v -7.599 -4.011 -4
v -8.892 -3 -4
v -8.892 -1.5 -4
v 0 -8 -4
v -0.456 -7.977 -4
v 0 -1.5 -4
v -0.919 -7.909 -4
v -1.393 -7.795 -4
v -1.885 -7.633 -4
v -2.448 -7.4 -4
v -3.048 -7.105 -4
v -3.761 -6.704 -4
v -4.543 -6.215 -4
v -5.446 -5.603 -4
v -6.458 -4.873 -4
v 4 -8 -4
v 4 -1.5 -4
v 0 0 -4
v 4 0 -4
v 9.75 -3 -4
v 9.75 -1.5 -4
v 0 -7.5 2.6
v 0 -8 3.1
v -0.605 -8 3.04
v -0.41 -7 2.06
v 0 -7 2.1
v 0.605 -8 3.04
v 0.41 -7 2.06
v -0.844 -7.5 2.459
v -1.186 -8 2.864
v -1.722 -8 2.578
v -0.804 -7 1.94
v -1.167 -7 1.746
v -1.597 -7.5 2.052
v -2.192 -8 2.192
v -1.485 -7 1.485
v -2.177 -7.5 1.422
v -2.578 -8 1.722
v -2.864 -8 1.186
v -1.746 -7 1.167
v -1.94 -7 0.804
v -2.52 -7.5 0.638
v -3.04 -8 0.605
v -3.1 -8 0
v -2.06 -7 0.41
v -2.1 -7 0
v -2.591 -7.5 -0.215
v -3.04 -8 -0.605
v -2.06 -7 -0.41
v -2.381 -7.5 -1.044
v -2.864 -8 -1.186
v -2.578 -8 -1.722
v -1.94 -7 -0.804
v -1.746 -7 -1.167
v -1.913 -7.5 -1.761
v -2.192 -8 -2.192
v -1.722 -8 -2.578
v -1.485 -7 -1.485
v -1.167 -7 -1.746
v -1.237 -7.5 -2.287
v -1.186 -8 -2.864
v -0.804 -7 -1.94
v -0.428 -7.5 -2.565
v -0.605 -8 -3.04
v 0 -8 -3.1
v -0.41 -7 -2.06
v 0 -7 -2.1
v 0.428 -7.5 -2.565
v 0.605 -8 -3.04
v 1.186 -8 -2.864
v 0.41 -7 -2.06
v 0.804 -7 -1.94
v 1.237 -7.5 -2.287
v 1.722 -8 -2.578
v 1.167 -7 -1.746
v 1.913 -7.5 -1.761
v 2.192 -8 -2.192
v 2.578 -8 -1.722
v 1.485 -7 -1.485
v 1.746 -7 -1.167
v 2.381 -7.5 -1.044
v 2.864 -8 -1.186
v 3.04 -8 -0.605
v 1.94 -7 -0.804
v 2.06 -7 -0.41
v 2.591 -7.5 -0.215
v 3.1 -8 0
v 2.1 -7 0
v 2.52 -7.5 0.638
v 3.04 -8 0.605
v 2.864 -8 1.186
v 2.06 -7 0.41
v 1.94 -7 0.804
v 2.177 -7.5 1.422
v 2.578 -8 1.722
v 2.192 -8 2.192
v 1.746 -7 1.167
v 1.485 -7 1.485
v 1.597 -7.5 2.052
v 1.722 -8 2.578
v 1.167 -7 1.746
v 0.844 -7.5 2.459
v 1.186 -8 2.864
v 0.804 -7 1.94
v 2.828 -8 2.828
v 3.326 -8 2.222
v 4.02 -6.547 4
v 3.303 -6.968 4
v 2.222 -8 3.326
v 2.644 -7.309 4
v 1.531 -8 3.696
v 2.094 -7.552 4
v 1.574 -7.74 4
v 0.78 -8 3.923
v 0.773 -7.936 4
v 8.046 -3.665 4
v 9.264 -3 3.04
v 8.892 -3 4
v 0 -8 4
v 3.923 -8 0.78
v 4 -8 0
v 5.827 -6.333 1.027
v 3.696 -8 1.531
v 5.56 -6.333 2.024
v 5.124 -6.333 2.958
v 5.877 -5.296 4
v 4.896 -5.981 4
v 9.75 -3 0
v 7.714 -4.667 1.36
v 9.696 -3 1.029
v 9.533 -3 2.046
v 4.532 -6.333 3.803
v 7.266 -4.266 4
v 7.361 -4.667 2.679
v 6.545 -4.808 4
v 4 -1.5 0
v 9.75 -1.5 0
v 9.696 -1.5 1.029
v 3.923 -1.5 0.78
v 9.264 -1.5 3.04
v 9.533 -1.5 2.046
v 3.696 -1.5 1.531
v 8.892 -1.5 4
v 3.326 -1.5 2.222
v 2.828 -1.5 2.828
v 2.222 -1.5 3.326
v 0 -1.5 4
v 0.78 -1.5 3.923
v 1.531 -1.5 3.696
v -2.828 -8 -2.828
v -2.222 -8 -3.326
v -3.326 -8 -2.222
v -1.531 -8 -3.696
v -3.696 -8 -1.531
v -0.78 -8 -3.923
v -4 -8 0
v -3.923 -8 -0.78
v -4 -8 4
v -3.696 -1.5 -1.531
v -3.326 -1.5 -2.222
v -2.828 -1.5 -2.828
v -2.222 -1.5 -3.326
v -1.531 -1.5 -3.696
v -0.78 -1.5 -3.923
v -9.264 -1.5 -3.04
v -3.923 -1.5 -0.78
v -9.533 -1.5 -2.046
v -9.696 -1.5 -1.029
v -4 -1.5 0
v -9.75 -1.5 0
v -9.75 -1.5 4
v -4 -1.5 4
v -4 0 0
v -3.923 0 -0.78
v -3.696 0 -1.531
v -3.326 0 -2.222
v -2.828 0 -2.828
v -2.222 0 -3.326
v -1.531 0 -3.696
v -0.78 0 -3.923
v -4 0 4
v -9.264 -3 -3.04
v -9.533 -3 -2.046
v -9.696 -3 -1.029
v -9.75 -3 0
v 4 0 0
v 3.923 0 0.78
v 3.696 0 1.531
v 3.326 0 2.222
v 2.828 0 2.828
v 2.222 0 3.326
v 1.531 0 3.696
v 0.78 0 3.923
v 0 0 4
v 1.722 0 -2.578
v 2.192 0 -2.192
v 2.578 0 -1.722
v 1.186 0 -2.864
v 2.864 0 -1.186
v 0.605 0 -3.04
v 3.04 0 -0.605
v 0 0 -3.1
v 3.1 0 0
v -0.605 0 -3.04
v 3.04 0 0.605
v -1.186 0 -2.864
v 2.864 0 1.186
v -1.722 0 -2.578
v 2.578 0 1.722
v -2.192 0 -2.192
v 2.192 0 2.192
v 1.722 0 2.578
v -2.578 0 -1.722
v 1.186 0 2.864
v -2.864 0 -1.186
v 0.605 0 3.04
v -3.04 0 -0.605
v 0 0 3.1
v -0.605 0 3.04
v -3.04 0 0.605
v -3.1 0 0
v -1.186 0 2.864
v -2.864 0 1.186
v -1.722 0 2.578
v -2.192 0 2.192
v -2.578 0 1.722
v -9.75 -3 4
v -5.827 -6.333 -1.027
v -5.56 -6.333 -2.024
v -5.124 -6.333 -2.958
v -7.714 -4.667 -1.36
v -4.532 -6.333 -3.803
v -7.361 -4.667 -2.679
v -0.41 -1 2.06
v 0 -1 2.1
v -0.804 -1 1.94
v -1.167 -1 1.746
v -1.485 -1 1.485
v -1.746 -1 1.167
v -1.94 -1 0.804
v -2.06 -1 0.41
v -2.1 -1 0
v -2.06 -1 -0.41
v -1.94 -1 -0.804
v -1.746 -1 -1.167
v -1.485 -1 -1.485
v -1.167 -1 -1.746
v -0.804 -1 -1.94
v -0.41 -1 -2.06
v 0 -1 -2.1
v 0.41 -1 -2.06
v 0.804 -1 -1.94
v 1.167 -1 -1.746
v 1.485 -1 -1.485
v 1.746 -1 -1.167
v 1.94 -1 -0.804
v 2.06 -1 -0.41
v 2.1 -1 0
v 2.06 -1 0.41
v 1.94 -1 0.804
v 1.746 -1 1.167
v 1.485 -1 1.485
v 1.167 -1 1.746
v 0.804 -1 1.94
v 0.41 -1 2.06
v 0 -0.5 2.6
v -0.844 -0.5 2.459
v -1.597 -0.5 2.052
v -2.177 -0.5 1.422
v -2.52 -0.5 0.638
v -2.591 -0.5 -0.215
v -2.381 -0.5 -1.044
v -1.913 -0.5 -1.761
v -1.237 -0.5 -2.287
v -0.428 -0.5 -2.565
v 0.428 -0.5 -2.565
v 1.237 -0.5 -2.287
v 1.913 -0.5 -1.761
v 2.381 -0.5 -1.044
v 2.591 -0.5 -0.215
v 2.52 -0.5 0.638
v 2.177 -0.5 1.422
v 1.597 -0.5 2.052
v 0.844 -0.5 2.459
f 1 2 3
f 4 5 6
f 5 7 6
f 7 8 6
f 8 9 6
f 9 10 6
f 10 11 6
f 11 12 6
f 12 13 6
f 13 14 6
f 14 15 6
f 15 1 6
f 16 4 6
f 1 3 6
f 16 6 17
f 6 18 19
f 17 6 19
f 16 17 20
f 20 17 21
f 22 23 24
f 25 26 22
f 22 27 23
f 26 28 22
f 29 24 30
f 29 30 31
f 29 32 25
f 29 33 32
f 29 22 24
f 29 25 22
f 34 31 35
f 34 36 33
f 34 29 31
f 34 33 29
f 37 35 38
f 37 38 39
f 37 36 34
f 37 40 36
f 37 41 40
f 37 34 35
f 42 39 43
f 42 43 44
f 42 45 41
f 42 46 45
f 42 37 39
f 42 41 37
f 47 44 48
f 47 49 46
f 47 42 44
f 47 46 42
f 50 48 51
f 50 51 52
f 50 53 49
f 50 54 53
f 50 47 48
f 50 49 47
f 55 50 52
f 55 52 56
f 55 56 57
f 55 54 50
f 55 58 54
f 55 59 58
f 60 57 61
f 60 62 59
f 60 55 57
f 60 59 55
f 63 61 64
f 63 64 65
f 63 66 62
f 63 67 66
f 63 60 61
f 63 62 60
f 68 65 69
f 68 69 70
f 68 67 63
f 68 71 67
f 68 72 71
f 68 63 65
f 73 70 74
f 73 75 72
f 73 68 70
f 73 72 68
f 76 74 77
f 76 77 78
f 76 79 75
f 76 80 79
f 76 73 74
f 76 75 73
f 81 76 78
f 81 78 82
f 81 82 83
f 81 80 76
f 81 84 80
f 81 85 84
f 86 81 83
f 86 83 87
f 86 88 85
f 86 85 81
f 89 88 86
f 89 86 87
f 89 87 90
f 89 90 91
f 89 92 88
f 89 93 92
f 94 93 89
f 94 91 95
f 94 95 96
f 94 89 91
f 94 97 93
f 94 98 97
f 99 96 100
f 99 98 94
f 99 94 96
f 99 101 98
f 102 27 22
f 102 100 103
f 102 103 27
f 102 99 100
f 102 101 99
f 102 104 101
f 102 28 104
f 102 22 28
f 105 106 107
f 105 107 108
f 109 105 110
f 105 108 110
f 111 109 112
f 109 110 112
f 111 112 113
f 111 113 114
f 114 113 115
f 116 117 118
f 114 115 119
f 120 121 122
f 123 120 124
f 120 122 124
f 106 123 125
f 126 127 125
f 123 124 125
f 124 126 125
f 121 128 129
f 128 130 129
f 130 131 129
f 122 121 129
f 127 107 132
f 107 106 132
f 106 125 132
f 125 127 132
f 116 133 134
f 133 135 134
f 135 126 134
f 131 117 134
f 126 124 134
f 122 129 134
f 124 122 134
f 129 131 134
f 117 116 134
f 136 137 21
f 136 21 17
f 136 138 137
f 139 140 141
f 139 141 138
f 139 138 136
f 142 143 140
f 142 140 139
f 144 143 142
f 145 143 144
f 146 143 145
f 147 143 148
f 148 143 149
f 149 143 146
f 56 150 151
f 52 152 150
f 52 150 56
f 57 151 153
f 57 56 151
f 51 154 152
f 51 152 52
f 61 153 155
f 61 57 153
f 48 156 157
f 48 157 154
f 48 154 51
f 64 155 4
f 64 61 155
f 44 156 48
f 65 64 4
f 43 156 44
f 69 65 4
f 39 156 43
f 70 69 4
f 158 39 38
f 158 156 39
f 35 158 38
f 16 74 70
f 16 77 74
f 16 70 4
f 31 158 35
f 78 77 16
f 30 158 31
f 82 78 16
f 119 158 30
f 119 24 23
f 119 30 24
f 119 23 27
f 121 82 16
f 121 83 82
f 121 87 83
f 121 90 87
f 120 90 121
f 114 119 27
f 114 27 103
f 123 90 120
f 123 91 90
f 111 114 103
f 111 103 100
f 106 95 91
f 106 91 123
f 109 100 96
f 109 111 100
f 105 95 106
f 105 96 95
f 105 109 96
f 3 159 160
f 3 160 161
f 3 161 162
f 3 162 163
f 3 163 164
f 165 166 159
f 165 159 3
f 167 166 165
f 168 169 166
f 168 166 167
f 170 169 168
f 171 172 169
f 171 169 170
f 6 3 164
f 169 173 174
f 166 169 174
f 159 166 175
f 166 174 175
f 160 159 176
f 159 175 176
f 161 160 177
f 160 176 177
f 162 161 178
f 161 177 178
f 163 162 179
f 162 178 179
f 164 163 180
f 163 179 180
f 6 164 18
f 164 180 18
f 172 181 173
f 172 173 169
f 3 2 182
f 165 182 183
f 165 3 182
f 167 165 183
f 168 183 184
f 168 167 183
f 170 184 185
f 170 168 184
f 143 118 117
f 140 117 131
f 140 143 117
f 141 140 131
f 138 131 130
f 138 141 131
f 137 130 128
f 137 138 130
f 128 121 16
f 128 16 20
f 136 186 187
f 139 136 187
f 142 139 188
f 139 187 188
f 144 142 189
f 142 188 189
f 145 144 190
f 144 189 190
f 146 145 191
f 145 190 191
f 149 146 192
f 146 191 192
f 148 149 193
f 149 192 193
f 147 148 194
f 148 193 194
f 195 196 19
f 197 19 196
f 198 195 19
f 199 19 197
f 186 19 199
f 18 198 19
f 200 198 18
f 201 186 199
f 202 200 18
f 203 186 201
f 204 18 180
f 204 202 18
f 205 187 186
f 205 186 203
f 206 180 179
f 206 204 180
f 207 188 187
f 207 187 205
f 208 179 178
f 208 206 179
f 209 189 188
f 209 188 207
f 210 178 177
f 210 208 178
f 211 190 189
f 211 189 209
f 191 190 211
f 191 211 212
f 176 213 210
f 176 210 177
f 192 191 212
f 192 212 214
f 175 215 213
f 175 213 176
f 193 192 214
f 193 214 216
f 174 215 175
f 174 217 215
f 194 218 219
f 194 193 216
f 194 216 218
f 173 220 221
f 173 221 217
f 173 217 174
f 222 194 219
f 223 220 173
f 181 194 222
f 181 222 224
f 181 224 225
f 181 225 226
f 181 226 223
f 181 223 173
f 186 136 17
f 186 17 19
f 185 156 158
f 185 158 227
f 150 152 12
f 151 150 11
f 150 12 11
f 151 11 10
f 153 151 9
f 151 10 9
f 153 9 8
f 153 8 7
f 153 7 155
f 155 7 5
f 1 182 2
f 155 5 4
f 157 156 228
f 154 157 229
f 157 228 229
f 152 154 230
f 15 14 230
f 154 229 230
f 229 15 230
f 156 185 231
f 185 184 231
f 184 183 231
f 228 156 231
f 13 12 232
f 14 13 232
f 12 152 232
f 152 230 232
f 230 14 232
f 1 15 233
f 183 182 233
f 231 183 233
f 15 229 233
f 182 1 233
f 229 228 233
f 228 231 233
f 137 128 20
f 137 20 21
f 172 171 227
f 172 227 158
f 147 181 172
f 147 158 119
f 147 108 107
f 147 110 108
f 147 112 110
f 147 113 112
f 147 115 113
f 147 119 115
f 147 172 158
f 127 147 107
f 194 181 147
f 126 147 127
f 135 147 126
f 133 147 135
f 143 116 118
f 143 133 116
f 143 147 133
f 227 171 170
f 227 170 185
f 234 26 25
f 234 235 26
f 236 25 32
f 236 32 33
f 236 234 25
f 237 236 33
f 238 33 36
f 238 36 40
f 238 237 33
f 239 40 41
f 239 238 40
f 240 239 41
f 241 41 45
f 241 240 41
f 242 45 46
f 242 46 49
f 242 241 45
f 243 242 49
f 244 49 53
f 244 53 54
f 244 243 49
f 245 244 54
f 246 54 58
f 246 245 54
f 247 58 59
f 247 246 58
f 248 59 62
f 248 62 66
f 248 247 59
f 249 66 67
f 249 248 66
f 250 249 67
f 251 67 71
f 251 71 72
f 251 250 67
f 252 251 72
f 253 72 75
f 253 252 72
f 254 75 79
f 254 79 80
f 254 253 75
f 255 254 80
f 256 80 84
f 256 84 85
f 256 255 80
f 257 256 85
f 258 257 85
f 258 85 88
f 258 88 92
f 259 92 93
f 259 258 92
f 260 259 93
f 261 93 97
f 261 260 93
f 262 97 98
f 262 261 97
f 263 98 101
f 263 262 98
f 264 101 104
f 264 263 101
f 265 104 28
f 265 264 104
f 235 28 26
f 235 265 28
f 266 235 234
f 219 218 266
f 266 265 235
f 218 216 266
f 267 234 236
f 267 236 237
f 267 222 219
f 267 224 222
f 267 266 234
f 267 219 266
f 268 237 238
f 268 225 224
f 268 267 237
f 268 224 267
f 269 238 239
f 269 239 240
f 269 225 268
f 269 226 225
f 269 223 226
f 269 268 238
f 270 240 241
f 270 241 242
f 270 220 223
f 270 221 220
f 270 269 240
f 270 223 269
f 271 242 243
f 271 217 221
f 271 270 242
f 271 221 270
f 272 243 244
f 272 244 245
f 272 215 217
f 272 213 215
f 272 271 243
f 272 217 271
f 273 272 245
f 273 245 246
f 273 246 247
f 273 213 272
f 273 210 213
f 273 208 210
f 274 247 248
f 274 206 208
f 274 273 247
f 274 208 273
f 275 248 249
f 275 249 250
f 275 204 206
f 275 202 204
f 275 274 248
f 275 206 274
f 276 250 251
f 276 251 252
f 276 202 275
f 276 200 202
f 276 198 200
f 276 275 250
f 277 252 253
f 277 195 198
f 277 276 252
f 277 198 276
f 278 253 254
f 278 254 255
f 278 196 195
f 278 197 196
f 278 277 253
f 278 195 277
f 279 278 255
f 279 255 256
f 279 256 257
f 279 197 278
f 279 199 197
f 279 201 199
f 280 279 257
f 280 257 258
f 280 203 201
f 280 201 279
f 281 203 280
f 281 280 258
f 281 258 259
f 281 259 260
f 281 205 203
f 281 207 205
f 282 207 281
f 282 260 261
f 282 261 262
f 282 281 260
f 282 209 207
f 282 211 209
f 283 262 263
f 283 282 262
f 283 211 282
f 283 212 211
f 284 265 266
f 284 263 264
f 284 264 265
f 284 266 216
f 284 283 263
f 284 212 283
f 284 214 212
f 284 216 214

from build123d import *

# Parameters (mm, degrees)
EXTRUDE_1_DEPTH     = 4
CUT_EXTRUDE_1_DEPTH = 1.5
CUT_EXTRUDE_2_DEPTH = 7.5


with BuildPart() as part:
    # Эскиз1 → Бобышка-Вытянуть1 (new body, symmetric)
    with BuildSketch(Plane.XY):
        Polygon((4, 0), (-4, 0), (-4, -1.5), (-9.75, -1.5), (-9.75, -8), (9.75, -8), (9.75, -1.5), (4, -1.5), align=None)
    extrude(amount=EXTRUDE_1_DEPTH, both=True)

    # Эскиз3 → Отверстие обработанное метчиком M53 (revolve, cut)
    with BuildSketch(Plane(origin=(0, 0, 0), x_dir=(0, 0, 1), z_dir=(1, 0, 0))):
        Polygon((0, 0), (0, 8), (3.1, 8), (2.1, 7), (2.1, 1), (3.1, 0), align=None)
    revolve(axis=Axis((0, 6.35, 0), (0, -1, 0)), mode=Mode.SUBTRACT)

    # Эскиз4 → Вырез-Вытянуть1 (cut)
    with BuildSketch(Plane(origin=(0, 0, 0), x_dir=(1, 0, 0), z_dir=(0, 1, 0))):
        with BuildLine():
            Line((-4, 4), (-4, 0))
            ThreePointArc((-4, 0), (-2.828427125, 2.828427125), (0, 4))
            Line((0, 4), (-4, 4))
        make_face()
        with BuildLine():
            Line((0, -4), (4, -4))
            Line((4, -4), (4, 0))
            ThreePointArc((4, 0), (2.828427125, -2.828427125), (0, -4))
        make_face()
    extrude(amount=-CUT_EXTRUDE_1_DEPTH, mode=Mode.SUBTRACT)

    # Эскиз5 → Вырез-Вытянуть2 (cut, through all)
    with BuildSketch(Plane(origin=(0, -1.5, 0), x_dir=(1, 0, 0), z_dir=(0, 1, 0))):
        with BuildLine():
            Line((-9.75, 0), (-9.75, 4))
            Line((-9.75, 4), (-8.891709622, 4))
            ThreePointArc((-8.891709622, 4), (-9.533012871, 2.045523305), (-9.75, 0))
        make_face()
        with BuildLine():
            Line((9.75, 0), (9.75, -4))
            Line((9.75, -4), (8.891709622, -4))
            ThreePointArc((8.891709622, -4), (9.533012871, -2.045523305), (9.75, 0))
        make_face()
    extrude(amount=-CUT_EXTRUDE_2_DEPTH, mode=Mode.SUBTRACT)

    # Вырез-По траектории1: sweep along a path in Эскиз7
    with BuildLine(Plane.XZ.offset(8)) as sweep_1_path:
        Line((0, 9.75), (-9.75, 9.75))
        Line((-9.75, 9.75), (-9.75, 0))
        ThreePointArc((-9.75, 0), (-6.894291117, -6.894291117), (0, -9.75))
        Line((0, -9.75), (9.75, -9.75))
        Line((9.75, -9.75), (9.75, 0))
        ThreePointArc((9.75, 0), (6.894291117, 6.894291117), (0, 9.75))
    # Эскиз6 → Вырез-По траектории1 (sweep, cut)
    with BuildSketch(Plane.XY.offset(4)):
        Polygon((-9.75, -3), (-9.75, -8), (-4, -8), align=None)
    sweep(path=sweep_1_path.line, transition=Transition.RIGHT, mode=Mode.SUBTRACT)


solid = part.part
